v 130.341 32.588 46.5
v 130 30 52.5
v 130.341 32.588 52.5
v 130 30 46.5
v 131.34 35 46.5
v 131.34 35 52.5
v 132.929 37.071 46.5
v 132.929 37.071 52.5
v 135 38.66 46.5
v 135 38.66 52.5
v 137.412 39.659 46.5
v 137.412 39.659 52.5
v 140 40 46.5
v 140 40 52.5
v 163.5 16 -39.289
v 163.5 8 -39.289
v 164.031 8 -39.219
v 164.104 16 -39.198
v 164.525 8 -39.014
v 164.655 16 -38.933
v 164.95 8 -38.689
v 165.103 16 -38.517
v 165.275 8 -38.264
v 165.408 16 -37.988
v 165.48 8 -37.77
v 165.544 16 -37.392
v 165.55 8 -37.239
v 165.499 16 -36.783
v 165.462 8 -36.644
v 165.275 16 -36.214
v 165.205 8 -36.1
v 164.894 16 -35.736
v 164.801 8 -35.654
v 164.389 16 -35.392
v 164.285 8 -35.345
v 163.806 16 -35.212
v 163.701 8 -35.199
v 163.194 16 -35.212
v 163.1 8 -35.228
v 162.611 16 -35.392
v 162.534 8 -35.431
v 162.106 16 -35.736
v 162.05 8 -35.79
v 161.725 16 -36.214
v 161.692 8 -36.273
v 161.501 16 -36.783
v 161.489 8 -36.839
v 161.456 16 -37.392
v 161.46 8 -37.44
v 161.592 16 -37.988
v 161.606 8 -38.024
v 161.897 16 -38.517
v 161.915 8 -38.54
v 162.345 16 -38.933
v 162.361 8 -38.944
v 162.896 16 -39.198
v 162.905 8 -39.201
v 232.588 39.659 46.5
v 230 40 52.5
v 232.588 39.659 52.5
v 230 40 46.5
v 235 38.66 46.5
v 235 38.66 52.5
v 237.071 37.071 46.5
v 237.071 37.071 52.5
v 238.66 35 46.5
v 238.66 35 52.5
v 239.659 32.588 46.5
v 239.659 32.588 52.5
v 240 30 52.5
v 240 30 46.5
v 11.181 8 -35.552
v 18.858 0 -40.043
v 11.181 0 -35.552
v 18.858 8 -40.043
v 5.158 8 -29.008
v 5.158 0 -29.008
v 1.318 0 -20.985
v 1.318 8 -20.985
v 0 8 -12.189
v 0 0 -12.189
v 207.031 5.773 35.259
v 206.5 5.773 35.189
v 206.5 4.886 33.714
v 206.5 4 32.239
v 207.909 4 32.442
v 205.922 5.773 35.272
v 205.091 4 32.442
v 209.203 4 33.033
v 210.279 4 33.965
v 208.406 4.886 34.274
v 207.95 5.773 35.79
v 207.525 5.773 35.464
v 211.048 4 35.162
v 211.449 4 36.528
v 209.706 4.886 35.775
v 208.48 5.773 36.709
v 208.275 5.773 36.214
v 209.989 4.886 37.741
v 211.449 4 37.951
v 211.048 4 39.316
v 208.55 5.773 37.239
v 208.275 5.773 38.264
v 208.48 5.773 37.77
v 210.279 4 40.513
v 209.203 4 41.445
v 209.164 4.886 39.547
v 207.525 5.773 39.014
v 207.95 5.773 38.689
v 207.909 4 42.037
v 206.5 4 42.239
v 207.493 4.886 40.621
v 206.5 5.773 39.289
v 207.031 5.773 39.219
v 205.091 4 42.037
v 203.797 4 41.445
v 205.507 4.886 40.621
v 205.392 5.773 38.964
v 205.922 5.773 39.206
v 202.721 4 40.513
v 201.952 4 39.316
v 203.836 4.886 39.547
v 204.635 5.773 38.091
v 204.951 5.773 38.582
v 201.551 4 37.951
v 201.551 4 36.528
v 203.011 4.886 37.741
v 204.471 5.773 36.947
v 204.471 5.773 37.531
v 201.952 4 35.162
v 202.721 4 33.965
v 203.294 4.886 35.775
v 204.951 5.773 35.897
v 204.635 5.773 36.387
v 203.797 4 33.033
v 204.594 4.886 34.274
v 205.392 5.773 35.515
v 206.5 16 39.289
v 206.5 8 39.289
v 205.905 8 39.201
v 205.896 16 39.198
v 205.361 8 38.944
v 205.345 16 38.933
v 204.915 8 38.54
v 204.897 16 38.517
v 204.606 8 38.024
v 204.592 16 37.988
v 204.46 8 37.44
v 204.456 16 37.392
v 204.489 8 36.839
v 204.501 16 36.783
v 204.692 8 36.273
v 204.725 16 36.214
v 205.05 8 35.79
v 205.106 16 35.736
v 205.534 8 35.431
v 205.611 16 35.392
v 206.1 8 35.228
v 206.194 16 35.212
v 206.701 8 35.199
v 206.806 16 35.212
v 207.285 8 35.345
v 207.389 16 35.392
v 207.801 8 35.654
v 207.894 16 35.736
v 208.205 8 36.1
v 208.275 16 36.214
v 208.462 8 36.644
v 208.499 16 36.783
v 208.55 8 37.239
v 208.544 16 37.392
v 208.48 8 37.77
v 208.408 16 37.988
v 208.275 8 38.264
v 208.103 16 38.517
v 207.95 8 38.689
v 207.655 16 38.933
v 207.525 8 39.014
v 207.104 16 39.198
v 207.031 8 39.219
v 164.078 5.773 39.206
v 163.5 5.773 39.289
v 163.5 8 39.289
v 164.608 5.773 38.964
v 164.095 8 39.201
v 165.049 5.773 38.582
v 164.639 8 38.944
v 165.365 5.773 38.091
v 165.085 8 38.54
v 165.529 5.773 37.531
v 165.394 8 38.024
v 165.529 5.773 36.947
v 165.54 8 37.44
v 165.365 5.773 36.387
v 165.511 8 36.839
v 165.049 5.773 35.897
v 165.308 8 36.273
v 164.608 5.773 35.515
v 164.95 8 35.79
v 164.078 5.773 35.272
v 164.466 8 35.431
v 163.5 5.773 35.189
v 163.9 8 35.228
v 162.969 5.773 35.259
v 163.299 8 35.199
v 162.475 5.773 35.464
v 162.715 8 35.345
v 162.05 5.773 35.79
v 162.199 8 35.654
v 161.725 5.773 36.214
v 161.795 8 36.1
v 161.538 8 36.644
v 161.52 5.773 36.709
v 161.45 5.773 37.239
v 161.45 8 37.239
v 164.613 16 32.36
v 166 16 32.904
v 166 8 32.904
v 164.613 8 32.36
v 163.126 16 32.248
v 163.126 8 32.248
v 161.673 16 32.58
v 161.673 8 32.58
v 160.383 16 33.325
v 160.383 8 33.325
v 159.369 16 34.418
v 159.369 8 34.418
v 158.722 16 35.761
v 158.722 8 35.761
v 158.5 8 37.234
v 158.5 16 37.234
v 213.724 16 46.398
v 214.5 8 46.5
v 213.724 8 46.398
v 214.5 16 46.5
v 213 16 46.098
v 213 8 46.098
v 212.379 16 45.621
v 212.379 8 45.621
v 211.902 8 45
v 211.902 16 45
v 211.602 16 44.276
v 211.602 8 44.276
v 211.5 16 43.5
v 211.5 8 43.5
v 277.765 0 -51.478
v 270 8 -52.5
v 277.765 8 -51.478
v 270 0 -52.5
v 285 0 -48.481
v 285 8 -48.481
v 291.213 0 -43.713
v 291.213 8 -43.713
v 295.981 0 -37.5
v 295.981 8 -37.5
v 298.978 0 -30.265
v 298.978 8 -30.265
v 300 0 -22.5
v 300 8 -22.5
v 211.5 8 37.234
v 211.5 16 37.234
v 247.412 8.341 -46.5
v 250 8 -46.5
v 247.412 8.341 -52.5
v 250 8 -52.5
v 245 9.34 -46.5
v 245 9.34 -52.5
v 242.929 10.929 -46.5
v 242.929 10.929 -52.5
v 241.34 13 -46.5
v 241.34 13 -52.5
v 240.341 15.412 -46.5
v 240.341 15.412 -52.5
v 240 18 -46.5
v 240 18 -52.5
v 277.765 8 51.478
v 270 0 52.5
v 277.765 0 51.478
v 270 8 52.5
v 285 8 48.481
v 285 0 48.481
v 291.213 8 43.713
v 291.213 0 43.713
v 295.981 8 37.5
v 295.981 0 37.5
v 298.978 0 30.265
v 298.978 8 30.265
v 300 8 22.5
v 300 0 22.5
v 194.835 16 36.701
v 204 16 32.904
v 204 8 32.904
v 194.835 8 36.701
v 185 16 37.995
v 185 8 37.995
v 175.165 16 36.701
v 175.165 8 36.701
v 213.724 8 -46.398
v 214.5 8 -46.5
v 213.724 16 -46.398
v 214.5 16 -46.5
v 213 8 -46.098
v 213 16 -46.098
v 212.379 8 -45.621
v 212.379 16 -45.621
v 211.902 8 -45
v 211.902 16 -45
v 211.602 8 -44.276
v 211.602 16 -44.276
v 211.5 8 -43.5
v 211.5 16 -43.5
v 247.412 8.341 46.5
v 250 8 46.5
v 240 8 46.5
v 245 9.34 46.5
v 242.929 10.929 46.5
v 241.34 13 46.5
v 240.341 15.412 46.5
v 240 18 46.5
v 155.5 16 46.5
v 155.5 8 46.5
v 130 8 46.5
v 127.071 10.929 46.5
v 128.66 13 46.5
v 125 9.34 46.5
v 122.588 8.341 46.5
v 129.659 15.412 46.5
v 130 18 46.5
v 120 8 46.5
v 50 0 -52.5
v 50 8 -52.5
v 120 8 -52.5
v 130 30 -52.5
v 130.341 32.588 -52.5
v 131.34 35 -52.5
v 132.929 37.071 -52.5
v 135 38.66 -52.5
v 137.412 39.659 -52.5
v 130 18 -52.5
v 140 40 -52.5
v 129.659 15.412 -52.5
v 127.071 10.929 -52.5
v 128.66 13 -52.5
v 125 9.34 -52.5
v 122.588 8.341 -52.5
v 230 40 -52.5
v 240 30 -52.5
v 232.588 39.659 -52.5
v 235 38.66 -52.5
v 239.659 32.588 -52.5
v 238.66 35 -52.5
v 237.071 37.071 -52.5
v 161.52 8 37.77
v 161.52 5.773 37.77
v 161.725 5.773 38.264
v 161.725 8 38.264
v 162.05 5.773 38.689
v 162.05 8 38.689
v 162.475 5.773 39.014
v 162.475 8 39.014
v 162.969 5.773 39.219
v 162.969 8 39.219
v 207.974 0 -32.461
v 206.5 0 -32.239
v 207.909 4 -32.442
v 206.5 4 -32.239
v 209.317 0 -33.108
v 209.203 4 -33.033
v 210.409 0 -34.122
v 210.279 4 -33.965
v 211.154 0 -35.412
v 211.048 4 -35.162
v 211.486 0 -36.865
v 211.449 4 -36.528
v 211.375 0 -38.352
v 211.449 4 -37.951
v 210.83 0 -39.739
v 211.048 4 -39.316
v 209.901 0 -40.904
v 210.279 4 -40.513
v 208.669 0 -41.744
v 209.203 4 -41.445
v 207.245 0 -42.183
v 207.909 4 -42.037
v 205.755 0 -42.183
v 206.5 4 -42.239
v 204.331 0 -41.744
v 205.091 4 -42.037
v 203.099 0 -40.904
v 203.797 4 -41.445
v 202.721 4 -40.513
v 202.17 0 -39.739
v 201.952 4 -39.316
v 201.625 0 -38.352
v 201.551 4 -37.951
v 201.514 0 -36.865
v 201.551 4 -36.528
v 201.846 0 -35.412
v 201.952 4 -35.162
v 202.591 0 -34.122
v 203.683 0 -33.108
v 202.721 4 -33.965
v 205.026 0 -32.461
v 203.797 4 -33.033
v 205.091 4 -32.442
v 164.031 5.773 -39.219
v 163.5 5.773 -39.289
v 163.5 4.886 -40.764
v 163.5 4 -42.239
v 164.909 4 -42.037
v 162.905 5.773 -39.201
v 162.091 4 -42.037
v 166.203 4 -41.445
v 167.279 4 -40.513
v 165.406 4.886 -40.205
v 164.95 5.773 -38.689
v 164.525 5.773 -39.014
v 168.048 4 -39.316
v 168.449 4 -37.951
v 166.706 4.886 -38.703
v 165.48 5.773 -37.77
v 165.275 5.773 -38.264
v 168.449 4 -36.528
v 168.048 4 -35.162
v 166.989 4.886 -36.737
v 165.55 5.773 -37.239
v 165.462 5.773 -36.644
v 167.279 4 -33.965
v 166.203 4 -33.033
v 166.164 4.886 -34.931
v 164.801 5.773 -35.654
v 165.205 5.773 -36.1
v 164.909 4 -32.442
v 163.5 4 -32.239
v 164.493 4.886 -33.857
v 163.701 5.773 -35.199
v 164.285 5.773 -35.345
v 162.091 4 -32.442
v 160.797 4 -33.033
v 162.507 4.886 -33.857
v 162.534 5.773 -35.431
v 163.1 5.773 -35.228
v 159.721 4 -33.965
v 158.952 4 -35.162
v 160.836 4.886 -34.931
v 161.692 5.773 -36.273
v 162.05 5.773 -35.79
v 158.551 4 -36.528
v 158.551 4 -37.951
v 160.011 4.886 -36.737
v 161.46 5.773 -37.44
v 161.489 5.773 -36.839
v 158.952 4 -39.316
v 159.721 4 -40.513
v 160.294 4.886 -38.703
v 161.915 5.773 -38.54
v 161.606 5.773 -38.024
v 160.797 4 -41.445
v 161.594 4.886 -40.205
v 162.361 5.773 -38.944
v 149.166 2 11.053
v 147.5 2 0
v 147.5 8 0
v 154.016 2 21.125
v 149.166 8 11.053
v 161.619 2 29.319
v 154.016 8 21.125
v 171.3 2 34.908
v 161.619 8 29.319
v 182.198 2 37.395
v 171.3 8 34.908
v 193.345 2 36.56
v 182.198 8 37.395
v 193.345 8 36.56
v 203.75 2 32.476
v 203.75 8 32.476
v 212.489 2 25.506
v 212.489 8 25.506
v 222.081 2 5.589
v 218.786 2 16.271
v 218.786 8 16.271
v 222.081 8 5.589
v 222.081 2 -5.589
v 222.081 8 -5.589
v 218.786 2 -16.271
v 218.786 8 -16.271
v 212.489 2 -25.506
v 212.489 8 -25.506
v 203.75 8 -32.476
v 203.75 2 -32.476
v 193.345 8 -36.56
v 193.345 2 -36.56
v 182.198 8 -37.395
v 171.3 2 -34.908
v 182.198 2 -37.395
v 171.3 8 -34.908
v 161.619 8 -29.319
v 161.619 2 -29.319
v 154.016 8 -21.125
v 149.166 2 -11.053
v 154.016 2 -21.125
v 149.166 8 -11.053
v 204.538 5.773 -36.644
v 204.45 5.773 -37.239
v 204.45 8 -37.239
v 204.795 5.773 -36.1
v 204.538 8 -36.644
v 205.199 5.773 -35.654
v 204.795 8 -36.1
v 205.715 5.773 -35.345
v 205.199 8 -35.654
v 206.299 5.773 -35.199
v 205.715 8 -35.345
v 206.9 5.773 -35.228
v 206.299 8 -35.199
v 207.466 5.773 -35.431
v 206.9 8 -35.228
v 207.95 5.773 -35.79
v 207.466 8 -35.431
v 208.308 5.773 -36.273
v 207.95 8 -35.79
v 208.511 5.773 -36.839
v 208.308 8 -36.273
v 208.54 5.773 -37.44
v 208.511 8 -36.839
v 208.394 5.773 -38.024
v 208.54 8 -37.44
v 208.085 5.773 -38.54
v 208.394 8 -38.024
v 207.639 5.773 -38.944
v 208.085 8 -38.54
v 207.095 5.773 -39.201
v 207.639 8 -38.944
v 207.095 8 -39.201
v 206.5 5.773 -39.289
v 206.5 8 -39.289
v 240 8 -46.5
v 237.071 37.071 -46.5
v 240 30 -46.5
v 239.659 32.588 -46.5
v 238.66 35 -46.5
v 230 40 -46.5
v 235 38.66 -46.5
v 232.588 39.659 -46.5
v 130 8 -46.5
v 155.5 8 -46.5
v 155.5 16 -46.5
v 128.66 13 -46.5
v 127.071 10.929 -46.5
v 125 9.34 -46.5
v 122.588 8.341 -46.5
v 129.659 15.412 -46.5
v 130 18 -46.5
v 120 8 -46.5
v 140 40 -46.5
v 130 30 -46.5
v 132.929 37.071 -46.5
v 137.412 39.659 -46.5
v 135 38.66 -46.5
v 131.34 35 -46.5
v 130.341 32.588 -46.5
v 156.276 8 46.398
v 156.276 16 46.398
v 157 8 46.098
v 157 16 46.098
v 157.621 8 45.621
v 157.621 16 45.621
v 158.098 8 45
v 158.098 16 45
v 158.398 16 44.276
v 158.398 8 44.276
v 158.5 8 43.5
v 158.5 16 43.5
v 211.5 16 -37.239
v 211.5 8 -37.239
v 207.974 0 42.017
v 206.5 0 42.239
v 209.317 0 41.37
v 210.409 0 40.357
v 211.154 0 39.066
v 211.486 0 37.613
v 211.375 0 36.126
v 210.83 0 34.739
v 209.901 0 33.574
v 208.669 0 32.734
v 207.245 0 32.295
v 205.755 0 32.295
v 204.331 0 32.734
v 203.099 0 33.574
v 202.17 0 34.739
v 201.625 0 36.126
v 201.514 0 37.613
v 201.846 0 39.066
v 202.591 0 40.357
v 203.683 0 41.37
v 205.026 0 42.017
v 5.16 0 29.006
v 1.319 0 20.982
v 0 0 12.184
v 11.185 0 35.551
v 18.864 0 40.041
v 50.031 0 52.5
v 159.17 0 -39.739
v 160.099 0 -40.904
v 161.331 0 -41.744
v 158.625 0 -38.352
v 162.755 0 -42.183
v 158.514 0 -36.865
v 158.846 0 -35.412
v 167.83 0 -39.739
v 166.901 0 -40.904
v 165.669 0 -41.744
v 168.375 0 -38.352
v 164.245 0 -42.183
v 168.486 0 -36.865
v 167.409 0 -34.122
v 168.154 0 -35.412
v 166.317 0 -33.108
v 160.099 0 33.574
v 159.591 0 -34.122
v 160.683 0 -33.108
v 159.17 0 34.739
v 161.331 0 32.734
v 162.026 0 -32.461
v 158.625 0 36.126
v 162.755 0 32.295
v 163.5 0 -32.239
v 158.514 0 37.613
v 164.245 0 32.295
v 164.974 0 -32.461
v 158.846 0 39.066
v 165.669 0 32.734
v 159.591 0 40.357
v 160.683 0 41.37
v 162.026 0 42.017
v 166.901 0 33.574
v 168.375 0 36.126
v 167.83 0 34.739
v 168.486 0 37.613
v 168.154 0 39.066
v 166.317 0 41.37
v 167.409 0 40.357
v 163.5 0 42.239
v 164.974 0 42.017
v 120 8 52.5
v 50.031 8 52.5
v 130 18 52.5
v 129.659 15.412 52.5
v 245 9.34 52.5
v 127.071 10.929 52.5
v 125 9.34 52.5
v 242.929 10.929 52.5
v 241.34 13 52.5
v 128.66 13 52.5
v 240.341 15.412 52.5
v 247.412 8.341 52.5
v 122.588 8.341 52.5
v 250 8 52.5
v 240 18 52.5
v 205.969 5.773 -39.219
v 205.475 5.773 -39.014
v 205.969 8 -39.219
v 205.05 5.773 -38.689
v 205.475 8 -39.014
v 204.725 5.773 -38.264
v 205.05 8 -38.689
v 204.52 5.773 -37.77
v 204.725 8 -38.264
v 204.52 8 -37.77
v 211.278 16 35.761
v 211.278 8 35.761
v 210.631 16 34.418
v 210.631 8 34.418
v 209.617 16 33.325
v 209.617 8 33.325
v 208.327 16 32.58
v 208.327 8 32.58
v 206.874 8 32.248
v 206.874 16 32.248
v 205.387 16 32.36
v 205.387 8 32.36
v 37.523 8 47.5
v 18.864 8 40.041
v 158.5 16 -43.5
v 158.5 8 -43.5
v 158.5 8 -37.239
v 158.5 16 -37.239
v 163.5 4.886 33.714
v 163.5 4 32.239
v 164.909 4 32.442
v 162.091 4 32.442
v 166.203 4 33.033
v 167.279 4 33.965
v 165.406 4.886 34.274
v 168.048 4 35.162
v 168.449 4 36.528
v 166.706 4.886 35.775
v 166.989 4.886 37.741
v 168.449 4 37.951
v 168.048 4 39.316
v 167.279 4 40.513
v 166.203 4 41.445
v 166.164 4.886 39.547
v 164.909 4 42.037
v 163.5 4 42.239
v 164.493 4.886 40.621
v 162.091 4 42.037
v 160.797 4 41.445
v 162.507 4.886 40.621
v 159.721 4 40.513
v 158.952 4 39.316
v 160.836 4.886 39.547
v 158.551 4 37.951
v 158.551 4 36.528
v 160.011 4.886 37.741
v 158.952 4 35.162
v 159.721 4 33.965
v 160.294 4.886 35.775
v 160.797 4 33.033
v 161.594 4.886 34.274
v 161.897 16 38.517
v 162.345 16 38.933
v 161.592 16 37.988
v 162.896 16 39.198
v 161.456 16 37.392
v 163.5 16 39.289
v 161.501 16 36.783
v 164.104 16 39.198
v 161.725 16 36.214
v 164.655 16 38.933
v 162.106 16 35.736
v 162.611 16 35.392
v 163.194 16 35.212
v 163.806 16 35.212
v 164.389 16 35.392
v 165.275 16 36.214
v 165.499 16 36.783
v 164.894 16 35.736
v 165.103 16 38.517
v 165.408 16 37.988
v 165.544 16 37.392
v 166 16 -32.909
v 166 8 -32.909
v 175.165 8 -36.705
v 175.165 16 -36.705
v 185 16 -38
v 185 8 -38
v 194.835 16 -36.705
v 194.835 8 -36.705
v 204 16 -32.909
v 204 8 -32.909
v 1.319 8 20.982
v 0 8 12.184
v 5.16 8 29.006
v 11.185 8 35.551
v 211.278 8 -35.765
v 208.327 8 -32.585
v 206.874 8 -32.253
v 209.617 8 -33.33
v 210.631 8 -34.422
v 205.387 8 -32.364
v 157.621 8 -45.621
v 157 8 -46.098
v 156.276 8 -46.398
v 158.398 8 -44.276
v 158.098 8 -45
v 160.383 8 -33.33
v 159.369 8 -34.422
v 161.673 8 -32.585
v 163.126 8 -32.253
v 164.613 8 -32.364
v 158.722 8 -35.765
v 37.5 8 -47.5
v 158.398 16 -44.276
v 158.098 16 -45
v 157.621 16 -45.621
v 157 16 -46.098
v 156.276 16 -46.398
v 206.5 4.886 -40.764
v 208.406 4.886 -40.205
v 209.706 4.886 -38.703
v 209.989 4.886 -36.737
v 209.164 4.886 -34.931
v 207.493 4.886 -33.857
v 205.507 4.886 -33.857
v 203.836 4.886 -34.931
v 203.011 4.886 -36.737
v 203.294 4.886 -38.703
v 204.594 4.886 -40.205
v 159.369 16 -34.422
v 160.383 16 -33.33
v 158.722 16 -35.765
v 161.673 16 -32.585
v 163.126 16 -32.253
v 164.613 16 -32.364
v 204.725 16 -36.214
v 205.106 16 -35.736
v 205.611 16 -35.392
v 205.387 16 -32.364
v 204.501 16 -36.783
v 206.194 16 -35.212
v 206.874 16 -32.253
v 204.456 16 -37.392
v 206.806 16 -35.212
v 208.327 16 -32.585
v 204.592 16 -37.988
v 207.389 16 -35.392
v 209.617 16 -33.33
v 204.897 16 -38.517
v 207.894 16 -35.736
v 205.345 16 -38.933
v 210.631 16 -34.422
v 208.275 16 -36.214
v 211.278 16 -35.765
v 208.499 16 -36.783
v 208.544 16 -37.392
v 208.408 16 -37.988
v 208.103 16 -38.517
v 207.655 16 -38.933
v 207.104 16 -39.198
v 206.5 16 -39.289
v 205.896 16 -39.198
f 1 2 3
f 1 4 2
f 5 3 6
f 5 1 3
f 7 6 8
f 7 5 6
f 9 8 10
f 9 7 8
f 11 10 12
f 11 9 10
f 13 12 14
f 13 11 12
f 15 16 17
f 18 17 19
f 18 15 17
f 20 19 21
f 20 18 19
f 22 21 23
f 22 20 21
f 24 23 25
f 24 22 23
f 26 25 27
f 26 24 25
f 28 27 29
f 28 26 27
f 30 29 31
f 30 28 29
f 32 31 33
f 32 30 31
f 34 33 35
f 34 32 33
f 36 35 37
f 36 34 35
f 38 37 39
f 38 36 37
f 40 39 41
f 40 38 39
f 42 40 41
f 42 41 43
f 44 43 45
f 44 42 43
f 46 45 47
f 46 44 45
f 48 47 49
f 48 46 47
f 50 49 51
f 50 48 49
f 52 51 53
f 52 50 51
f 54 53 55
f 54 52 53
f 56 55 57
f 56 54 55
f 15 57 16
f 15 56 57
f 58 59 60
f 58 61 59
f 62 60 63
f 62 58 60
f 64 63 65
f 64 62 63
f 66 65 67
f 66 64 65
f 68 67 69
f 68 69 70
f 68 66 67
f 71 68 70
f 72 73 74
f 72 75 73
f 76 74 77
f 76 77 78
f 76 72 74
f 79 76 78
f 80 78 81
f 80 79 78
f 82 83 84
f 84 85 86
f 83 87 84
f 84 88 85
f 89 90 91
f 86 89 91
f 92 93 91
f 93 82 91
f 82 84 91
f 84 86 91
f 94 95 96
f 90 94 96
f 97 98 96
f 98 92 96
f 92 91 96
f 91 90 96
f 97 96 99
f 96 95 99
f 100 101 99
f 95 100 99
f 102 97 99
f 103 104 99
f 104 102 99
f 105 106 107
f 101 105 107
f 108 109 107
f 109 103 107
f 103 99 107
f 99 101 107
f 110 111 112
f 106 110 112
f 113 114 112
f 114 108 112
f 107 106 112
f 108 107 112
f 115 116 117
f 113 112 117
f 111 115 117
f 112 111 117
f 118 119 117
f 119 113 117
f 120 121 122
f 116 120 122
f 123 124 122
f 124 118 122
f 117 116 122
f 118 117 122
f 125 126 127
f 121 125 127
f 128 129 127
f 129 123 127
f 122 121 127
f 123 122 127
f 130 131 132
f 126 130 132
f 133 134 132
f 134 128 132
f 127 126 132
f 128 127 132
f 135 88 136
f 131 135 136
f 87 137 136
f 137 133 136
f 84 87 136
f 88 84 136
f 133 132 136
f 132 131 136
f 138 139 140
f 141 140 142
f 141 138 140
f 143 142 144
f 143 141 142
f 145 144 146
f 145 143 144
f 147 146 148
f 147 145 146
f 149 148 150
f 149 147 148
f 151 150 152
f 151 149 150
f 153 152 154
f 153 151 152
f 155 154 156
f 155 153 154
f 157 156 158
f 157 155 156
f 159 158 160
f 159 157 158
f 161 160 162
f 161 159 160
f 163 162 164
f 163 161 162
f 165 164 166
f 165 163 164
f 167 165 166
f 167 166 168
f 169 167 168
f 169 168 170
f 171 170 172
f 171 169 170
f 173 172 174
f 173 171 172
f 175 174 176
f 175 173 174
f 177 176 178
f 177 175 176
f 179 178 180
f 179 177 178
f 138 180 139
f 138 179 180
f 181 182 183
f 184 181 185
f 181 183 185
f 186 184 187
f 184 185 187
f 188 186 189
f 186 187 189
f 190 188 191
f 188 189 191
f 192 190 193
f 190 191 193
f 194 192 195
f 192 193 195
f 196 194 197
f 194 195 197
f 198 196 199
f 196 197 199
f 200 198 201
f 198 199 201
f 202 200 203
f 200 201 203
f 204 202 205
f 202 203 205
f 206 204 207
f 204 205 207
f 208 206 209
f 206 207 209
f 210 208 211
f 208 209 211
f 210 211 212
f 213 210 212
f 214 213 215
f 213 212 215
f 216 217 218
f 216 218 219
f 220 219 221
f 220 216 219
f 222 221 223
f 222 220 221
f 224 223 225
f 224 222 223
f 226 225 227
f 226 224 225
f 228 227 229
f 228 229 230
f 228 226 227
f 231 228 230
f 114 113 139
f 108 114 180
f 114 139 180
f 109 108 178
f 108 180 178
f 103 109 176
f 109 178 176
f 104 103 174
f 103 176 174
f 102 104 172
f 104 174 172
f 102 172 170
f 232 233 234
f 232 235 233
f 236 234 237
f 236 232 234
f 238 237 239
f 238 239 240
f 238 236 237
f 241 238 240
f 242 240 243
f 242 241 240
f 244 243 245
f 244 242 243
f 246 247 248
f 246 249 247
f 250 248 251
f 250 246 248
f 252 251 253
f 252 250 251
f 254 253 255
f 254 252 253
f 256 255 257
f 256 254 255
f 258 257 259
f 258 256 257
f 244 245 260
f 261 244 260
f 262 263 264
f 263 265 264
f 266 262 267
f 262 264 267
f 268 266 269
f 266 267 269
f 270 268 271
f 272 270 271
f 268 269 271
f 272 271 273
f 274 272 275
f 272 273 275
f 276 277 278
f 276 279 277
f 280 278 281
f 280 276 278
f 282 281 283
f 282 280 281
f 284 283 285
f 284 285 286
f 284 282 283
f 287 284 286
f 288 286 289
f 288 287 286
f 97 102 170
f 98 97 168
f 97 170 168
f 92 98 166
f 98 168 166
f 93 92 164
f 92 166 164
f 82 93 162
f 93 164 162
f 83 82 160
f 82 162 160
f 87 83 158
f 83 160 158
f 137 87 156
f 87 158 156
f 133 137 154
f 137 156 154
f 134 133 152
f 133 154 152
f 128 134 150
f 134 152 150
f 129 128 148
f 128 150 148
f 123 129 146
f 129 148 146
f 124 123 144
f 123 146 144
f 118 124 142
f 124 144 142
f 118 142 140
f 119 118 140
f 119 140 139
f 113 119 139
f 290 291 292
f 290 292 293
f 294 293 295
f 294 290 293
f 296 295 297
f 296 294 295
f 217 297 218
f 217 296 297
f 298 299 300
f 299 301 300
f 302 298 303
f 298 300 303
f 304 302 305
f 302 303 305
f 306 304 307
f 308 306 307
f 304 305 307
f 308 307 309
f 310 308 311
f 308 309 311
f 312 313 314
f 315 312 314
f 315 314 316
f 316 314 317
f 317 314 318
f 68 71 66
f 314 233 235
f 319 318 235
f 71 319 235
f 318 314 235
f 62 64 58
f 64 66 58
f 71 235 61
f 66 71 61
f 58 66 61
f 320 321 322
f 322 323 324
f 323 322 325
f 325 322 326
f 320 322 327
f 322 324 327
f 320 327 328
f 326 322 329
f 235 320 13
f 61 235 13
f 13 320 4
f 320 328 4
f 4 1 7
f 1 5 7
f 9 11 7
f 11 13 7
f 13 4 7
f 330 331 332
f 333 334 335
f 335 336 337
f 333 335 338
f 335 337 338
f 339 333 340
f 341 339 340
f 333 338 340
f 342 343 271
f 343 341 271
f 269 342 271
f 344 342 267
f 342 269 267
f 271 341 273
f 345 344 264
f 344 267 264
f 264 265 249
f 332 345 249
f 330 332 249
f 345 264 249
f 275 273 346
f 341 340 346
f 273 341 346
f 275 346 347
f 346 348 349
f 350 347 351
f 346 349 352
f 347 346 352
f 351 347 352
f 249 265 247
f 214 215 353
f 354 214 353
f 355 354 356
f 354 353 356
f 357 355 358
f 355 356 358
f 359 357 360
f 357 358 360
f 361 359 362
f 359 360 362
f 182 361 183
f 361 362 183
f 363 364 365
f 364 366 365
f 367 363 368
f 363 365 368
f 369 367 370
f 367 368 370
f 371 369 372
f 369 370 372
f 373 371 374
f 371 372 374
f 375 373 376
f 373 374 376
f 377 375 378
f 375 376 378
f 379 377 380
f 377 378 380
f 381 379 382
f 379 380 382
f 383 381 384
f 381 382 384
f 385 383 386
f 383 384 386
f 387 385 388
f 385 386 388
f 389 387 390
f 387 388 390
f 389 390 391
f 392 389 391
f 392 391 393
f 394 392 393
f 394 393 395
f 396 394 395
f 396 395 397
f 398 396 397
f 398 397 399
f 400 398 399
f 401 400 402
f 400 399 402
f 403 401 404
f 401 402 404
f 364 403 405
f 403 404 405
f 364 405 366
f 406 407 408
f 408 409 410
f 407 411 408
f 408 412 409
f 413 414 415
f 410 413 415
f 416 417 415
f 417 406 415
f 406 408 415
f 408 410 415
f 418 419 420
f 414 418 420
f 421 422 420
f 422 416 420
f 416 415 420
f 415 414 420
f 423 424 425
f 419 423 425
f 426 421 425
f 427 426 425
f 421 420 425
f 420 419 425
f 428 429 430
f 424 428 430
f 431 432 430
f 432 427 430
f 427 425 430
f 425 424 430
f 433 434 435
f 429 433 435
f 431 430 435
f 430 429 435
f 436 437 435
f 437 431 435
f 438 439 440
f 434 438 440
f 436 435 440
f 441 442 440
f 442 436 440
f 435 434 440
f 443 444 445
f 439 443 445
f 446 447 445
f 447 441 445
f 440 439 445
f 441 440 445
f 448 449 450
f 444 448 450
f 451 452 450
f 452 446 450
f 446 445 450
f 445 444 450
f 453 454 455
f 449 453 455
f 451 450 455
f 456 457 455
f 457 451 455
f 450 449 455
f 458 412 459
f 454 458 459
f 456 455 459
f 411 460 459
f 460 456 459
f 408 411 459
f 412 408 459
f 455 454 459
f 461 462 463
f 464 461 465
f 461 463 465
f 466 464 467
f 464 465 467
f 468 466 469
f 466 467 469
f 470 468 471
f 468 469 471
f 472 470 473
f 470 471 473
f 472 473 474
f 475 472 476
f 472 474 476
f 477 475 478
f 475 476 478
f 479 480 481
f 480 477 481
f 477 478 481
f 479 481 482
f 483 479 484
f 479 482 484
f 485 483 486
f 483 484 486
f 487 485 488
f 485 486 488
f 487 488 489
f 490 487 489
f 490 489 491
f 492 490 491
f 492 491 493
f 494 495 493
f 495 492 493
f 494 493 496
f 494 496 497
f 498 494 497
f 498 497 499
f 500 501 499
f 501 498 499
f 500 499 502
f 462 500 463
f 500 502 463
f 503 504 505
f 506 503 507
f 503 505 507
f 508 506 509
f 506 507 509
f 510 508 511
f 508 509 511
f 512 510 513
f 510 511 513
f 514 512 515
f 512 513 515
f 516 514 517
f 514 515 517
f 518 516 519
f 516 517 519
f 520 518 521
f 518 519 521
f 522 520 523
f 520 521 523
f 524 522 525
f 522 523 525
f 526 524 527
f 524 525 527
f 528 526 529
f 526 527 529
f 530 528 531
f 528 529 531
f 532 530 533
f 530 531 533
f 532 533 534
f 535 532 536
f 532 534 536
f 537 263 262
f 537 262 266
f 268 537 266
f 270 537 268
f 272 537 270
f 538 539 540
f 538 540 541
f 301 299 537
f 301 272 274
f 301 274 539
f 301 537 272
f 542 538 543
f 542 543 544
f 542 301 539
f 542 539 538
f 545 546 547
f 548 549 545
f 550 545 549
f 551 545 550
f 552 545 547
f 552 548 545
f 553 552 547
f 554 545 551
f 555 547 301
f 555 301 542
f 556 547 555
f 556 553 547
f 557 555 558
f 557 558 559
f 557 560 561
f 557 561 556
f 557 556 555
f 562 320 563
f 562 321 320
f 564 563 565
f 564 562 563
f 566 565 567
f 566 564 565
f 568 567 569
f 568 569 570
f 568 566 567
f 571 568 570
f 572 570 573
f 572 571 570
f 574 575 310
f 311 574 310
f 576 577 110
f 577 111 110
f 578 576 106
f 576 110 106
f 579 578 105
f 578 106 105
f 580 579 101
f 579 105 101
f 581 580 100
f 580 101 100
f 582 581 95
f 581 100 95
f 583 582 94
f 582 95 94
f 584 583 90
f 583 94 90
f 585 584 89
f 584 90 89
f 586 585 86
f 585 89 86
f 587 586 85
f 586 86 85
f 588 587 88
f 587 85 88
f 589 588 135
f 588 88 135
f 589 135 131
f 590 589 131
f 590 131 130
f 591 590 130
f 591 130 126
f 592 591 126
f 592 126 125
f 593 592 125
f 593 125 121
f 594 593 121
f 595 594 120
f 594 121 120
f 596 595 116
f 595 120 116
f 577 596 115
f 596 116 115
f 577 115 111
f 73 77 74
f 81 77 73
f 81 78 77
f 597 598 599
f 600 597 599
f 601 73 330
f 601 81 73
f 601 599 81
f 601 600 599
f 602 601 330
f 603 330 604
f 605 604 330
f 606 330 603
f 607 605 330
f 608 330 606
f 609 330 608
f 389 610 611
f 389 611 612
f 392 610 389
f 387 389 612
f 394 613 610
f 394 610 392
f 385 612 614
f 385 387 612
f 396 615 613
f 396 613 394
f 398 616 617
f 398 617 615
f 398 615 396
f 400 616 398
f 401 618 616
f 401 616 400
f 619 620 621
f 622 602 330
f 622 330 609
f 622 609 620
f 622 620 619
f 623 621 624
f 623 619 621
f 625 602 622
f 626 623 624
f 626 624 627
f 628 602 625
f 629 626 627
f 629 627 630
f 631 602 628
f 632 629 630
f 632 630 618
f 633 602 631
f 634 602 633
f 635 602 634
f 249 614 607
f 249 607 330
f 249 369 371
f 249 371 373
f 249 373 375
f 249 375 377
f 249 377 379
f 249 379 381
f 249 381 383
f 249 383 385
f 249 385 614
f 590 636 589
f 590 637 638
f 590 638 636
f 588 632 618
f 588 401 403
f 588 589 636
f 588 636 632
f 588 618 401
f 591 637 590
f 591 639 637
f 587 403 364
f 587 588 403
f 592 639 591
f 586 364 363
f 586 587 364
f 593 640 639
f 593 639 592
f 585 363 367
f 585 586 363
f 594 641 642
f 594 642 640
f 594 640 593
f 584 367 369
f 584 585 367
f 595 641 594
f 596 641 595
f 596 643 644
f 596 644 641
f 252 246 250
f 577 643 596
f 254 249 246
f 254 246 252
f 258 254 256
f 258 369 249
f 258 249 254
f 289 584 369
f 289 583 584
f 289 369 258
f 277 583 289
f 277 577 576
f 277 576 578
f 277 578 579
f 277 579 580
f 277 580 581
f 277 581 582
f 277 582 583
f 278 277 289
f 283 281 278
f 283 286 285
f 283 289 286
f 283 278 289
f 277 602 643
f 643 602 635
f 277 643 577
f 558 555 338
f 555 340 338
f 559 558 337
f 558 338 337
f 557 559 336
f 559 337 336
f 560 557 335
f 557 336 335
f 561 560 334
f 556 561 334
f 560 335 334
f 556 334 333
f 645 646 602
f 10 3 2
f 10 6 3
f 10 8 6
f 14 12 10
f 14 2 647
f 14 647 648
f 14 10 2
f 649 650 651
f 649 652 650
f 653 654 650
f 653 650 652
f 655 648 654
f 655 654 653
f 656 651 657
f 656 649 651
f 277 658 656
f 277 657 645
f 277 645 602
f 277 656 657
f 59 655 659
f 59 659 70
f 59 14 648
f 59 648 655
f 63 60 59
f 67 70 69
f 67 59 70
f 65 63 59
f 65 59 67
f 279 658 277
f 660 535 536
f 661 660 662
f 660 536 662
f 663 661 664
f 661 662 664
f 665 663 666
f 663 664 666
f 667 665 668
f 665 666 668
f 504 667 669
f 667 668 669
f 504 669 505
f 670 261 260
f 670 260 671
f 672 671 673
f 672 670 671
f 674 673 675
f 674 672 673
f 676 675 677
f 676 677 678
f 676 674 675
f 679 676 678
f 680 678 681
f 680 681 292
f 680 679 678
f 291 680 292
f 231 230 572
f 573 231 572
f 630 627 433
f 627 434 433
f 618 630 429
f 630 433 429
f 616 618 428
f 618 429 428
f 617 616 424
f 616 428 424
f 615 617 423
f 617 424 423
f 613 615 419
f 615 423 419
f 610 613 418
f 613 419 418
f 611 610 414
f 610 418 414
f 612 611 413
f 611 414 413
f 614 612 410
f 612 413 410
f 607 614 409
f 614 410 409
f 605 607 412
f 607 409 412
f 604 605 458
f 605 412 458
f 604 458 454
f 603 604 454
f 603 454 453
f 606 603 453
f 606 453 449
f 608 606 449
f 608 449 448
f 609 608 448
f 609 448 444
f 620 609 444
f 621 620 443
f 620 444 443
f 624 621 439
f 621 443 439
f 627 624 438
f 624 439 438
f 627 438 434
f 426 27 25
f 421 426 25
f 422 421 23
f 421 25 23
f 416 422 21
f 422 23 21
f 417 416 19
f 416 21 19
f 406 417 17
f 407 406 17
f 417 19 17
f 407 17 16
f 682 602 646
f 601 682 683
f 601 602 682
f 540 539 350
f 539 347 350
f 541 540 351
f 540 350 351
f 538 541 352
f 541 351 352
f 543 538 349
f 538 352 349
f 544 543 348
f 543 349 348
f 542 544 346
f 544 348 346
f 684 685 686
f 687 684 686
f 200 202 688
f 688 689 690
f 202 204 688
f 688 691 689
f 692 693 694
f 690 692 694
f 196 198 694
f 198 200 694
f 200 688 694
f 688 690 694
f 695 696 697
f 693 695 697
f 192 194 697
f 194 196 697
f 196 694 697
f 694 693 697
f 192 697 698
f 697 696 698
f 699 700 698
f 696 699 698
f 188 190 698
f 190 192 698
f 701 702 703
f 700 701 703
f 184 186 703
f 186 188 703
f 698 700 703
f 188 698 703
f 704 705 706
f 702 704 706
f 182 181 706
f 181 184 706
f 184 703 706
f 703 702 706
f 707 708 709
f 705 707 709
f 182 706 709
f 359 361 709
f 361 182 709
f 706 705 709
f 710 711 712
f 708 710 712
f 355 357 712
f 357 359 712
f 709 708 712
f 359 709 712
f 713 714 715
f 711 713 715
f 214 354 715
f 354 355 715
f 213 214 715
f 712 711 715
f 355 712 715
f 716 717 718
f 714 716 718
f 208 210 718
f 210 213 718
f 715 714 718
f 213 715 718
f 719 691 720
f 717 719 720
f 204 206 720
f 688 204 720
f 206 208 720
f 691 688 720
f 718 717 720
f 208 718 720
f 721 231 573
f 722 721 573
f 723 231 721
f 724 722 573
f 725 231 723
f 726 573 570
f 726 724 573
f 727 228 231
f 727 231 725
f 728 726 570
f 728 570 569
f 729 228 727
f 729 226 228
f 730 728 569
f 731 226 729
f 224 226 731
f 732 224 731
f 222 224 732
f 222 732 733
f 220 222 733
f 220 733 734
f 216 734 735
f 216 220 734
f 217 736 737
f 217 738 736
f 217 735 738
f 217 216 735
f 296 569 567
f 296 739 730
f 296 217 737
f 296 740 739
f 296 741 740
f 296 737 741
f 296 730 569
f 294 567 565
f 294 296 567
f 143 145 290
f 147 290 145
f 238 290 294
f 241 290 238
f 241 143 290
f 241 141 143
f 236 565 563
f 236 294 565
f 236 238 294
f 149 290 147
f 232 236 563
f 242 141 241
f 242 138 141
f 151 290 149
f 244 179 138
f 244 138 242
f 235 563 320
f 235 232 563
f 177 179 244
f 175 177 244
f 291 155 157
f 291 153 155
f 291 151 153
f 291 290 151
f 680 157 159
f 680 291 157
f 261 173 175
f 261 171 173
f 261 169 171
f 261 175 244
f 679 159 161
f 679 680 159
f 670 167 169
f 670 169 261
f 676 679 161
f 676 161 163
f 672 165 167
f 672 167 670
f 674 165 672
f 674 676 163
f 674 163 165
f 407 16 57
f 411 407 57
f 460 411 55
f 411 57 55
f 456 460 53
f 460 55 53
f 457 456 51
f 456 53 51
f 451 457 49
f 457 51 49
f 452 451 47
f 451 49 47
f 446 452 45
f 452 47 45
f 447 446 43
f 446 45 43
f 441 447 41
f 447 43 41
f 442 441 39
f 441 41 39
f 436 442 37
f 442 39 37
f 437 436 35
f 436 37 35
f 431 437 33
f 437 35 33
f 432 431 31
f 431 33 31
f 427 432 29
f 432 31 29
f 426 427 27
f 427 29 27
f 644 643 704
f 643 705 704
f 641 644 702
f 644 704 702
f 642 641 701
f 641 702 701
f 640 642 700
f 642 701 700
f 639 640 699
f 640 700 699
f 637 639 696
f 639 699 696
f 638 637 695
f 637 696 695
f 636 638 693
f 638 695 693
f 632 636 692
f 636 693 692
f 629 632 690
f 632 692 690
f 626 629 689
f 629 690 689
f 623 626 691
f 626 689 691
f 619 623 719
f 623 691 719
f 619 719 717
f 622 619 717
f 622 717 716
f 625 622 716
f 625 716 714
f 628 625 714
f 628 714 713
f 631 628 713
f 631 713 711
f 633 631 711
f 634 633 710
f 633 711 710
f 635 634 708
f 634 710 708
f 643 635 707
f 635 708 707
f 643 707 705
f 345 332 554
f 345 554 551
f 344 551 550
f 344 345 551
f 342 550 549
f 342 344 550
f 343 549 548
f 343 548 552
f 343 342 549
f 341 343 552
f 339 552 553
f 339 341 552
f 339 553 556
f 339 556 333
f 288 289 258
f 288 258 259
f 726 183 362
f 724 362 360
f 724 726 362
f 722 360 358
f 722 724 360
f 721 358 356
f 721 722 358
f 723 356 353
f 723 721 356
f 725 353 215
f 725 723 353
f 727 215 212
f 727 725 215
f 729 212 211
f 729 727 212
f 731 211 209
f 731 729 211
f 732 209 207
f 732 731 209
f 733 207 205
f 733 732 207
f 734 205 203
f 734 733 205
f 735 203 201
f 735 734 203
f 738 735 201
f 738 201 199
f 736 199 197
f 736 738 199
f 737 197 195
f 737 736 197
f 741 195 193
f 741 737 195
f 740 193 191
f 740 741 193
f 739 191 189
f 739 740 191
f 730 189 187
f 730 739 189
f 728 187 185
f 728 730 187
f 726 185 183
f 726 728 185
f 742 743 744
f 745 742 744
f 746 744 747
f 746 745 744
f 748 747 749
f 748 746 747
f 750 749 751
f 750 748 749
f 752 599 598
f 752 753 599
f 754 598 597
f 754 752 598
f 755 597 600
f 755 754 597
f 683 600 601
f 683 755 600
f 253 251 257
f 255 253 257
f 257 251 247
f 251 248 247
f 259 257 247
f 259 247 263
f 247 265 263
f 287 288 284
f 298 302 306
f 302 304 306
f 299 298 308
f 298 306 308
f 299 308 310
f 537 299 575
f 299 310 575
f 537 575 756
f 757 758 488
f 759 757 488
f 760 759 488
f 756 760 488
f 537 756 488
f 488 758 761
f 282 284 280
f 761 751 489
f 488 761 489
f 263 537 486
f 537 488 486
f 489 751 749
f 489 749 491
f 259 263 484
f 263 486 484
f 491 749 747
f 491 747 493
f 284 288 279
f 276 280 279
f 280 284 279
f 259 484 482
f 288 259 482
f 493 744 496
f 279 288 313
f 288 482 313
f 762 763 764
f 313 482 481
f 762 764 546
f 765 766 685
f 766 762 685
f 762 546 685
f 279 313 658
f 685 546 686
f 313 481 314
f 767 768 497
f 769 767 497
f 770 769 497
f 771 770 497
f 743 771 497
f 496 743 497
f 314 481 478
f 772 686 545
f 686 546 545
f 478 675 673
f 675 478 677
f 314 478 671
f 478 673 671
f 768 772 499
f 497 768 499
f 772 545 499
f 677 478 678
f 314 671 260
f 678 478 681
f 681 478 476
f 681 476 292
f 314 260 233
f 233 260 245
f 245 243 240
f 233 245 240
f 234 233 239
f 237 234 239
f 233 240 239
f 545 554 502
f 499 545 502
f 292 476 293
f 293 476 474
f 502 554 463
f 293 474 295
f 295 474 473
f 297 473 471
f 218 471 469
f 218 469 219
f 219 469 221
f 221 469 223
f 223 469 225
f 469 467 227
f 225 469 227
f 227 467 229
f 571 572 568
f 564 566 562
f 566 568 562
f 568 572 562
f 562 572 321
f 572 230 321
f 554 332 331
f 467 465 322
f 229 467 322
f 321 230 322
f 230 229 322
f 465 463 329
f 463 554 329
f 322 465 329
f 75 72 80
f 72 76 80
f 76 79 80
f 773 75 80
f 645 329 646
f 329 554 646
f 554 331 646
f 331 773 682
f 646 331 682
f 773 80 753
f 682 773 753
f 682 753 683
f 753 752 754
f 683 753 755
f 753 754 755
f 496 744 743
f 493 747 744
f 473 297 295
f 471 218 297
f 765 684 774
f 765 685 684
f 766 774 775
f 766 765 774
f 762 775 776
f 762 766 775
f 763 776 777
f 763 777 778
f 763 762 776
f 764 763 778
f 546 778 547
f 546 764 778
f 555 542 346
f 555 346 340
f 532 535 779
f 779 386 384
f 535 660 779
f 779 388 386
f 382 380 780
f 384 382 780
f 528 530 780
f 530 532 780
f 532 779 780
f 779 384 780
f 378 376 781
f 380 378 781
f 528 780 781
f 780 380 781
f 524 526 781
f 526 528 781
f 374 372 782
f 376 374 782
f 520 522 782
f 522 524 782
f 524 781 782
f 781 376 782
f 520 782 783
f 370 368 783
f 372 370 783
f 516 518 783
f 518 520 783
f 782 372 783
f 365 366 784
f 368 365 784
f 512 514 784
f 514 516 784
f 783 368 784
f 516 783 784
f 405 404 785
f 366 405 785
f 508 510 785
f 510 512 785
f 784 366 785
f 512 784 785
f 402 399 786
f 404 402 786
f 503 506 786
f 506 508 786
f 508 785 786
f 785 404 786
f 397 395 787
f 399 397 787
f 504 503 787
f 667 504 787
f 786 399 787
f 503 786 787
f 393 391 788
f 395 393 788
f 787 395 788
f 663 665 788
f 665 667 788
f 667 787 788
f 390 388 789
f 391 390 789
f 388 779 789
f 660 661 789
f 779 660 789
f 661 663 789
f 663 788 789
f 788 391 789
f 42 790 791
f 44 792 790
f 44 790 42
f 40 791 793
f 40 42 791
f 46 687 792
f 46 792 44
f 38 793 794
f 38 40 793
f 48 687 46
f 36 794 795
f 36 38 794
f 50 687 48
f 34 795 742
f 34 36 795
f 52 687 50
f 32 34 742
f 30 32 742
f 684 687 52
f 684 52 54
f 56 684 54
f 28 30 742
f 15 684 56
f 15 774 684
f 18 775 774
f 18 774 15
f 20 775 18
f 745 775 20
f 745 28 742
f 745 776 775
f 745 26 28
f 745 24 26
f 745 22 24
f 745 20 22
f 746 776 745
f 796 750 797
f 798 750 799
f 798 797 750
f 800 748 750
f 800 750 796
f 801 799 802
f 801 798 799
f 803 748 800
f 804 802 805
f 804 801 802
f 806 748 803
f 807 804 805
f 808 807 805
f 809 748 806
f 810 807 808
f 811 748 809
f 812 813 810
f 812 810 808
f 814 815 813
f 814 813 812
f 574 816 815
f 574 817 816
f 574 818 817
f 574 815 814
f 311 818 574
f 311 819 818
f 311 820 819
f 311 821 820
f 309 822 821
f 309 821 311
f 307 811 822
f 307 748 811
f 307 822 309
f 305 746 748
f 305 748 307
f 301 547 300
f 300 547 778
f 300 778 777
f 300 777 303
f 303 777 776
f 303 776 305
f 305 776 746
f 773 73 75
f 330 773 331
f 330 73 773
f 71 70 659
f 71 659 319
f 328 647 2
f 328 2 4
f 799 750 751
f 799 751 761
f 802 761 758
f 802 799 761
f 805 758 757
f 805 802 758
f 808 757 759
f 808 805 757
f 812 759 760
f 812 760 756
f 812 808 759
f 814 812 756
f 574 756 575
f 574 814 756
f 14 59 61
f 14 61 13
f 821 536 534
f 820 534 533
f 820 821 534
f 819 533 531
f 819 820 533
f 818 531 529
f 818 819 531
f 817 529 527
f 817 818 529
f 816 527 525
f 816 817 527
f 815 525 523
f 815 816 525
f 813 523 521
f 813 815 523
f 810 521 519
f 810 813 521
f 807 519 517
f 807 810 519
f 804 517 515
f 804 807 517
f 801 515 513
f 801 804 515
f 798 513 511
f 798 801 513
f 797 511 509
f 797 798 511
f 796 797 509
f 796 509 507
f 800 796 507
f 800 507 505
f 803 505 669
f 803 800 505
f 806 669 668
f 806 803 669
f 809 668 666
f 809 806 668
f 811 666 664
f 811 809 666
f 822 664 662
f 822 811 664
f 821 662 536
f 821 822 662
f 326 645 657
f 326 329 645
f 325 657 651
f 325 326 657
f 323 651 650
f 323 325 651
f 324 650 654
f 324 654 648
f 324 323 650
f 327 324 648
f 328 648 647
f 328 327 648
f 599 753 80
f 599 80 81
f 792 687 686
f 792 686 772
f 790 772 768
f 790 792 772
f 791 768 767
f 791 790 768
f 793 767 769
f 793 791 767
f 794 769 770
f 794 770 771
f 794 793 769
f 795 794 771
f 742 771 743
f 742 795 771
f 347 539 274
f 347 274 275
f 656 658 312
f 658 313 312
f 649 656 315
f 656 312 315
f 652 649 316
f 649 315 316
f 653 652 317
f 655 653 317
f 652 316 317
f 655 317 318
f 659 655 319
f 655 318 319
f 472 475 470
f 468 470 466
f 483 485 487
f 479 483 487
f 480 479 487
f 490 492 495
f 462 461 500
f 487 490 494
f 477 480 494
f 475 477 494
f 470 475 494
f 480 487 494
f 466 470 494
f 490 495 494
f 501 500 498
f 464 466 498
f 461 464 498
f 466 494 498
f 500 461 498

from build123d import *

# Parameters (mm, degrees)
EXTRUDE_1_DEPTH        = 52.5
SKETCH_3_W             = 60
SKETCH_3_H             = 105
CUT_EXTRUDE_1_DEPTH    = 32
SKETCH_4_W             = 54
SKETCH_4_H             = 71
SKETCH_4_R             = 9.5
EXTRUDE_3_DEPTH        = 22.5
SKETCH_4_3_W           = 54
SKETCH_4_3_H           = 71
SKETCH_4_3_R           = 9.5
CUT_EXTRUDE_2_DEPTH    = 14.5
SKETCH_5_R             = 9.5
SKETCH_5_R_2           = 8
EXTRUDE_4_DEPTH        = 2
EXTRUDE_START          = -2
SKETCH_6_R             = 9.5
SKETCH_6_R_2           = 8
EXTRUDE_5_DEPTH        = 2
FILLET_1_R             = 14
FILLET_1_OF_MIRROR_2_R = 14
SKETCH_8_W             = 95
SKETCH_8_H             = 78.931088685
CUT_EXTRUDE_4_DEPTH    = 130
SKETCH_10_W            = 100
SKETCH_10_H            = 93
CUT_EXTRUDE_6_DEPTH    = 32
CUT_EXTRUDE_7_DEPTH    = 73
SKETCH_12_W            = 19.42301832
SKETCH_12_H            = 121.860085881
CUT_EXTRUDE_8_DEPTH    = 73
CUT_EXTRUDE_10_DEPTH   = 150
SKETCH_15_R            = 2.05
SKETCH_15_R_2          = 37.5
CUT_EXTRUDE_11_DEPTH   = 313.725518626
SKETCH_18_W            = 61.222247188
SKETCH_18_H            = 97.808163194
CUT_EXTRUDE_13_DEPTH   = 170
SKETCH_19_R            = 37.5
EXTRUDE_6_DEPTH        = 2
FILLET_2_R             = 30
SKETCH_21_W            = 132.10932858
SKETCH_21_H            = 125.518868867
CUT_EXTRUDE_15_DEPTH   = 149
MM_1_D                 = 10
MM_1_DEPTH             = 4
MM_1_TIP               = 3.004303095
SKETCH_23_W            = 93
SKETCH_23_H            = 32
CUT_EXTRUDE_16_DEPTH   = 149
FILLET_3_R             = 10
EXTRUDE_START_2        = 8
EXTRUDE_8_DEPTH        = 8
CUT_EXTRUDE_START      = -47
SKETCH_27_R            = 2.05
CUT_EXTRUDE_18_DEPTH   = 47
FILLET_4_R             = 3


with BuildPart() as part:
    # 草图1 → 凸台-拉伸1 (new, symmetric)
    with BuildSketch(Plane.XY):
        Polygon((0, 0), (300, 0), (300, 40), (130, 40), (0, 8), align=None)
    extrude(amount=EXTRUDE_1_DEPTH, both=True)

    # 草图3 → 切除-拉伸1 (cut)
    with BuildSketch(Plane(origin=(0, 40, 0), x_dir=(1, 0, 0), z_dir=(0, 1, 0))):
        with Locations((270, 0)):
            Rectangle(SKETCH_3_W, SKETCH_3_H)
    extrude(amount=-CUT_EXTRUDE_1_DEPTH, mode=Mode.SUBTRACT)

    # 草图4 → 凸台-拉伸3 (add, symmetric)
    with BuildSketch(Plane.XY.offset(30)):
        with Locations((273, 43.5)):
            Rectangle(SKETCH_4_W, SKETCH_4_H)
        with Locations(Location((260, 65, 0), (0, 0, 180))):
            Circle(SKETCH_4_R, mode=Mode.SUBTRACT)
    extrude_3 = extrude(amount=EXTRUDE_3_DEPTH, both=True)

    # 草图4<3> → 切除-拉伸2 (cut, symmetric)
    with BuildSketch(Plane.XY.offset(30)):
        with Locations((273, 43.5)):
            Rectangle(SKETCH_4_3_W, SKETCH_4_3_H)
        with Locations(Location((260, 65, 0), (0, 0, 180))):
            Circle(SKETCH_4_3_R, mode=Mode.SUBTRACT)
    cut_extrude_2 = extrude(amount=CUT_EXTRUDE_2_DEPTH, both=True, mode=Mode.SUBTRACT)

    # 草图5 → 凸台-拉伸4 (add)
    with BuildSketch(Plane(origin=(0, 0, 44.5), x_dir=(-1, 0, 0), z_dir=(0, 0, -1))):
        with Locations((-260, 65)):
            Circle(SKETCH_5_R)
        with Locations((-260, 65)):
            Circle(SKETCH_5_R_2, mode=Mode.SUBTRACT)
    extrude_4 = extrude(amount=-EXTRUDE_4_DEPTH)

    # 草图6 → 凸台-拉伸5 (add)
    with BuildSketch(Plane.XY.offset(15.5).offset(EXTRUDE_START)):
        with Locations(Location((260, 65, 0), (0, 0, 180))):
            Circle(SKETCH_6_R)
        with Locations(Location((260, 65, 0), (0, 0, 180))):
            Circle(SKETCH_6_R_2, mode=Mode.SUBTRACT)
    extrude_5 = extrude(amount=EXTRUDE_5_DEPTH)

    # 圆角1
    fillet_1_edges = [part.edges().sort_by_distance(p)[0] for p in [
        (246, 79, 48.5),
        (246, 79, 11.5),
    ]]
    fillet(fillet_1_edges, radius=FILLET_1_R)

    # 镜向2: 凸台-拉伸3, 切除-拉伸2, 凸台-拉伸4, 凸台-拉伸5 across plane
    add(extrude_3.mirror(Plane.XY))
    add(cut_extrude_2.mirror(Plane.XY), mode=Mode.SUBTRACT)
    add(extrude_4.mirror(Plane.XY))
    add(extrude_5.mirror(Plane.XY))

    # 圆角1 of 镜向2
    fillet_1_of_mirror_2_edges = [part.edges().sort_by_distance(p)[0] for p in [
        (246, 79, -48.5),
        (246, 79, -11.5),
    ]]
    fillet(fillet_1_of_mirror_2_edges, radius=FILLET_1_OF_MIRROR_2_R)

    # 草图8 → 切除-拉伸4 (cut)
    with BuildSketch(Plane.ZY):
        with Locations((0, 47.465544343)):
            Rectangle(SKETCH_8_W, SKETCH_8_H)
    extrude(amount=-CUT_EXTRUDE_4_DEPTH, mode=Mode.SUBTRACT)

    # 草图10 → 切除-拉伸6 (cut)
    with BuildSketch(Plane(origin=(0, 40, 0), x_dir=(1, 0, 0), z_dir=(0, 1, 0))):
        with Locations((185, 0)):
            Rectangle(SKETCH_10_W, SKETCH_10_H)
    extrude(amount=-CUT_EXTRUDE_6_DEPTH, mode=Mode.SUBTRACT)

    # 草图11 → 切除-拉伸7 (cut)
    with BuildSketch(Plane.XZ):
        Polygon((-14.613233699, 52.5), (50.030946001, 52.5), (0, 32.5), (0, -32.5), (50, -52.5), (-14.613233699, -52.5), align=None)
    extrude(amount=-CUT_EXTRUDE_7_DEPTH, mode=Mode.SUBTRACT)

    # 草图12 → 切除-拉伸8 (cut)
    with BuildSketch(Plane(origin=(0, 8, 0), x_dir=(1, 0, 0), z_dir=(0, 1, 0))):
        with Locations((40.28849084, -8.430042941)):
            Rectangle(SKETCH_12_W, SKETCH_12_H)
    extrude(amount=CUT_EXTRUDE_8_DEPTH, mode=Mode.SUBTRACT)

    # 草图14 → 切除-拉伸10 (cut, symmetric)
    with BuildSketch(Plane.XY.offset(52.5)):
        with BuildLine():
            Line((275.075376069, 79), (318.037843951, 79))
            Line((318.037843951, 79), (300, 8))
            ThreePointArc((300, 8), (292.070381124, 45.091206629), (275.075376069, 79))
        make_face()
    extrude(amount=CUT_EXTRUDE_10_DEPTH, both=True, mode=Mode.SUBTRACT)

    # 草图15 → 切除-拉伸11 (cut, through all)
    with BuildSketch(Plane(origin=(0, 8, 0), x_dir=(1, 0, 0), z_dir=(0, 1, 0))):
        with Locations(Location((163.5, -37.239092363, 0), (0, 0, 180))):
            Circle(SKETCH_15_R)
        with Locations((163.5, 37.239092363)):
            Circle(SKETCH_15_R)
        with Locations(Location((206.5, 37.239092363, 0), (0, 0, 180))):
            Circle(SKETCH_15_R)
        with Locations((206.5, -37.239092363)):
            Circle(SKETCH_15_R)
        with Locations(Location((185, 0, 0), (0, 0, 180))):
            Circle(SKETCH_15_R_2)
    extrude(amount=-CUT_EXTRUDE_11_DEPTH, mode=Mode.SUBTRACT)

    # 草图18 → 切除-拉伸13 (cut)
    with BuildSketch(Plane.XY.offset(52.5)):
        with Locations((276.611123594, 56.904081597)):
            Rectangle(SKETCH_18_W, SKETCH_18_H)
    extrude(amount=-CUT_EXTRUDE_13_DEPTH, mode=Mode.SUBTRACT)

    # 草图19 → 凸台-拉伸6 (add)
    with BuildSketch(Plane.XZ.offset(EXTRUDE_START)):
        with Locations(Location((185, 0, 0), (0, 0, 180))):
            Circle(SKETCH_19_R)
    extrude(amount=EXTRUDE_6_DEPTH)

    # 圆角2
    fillet_2_edges = [part.edges().sort_by_distance(p)[0] for p in [
        (300, 4, 52.5),
        (0, 4, 32.5),
        (0, 4, -32.5),
        (300, 4, -52.5),
    ]]
    fillet(fillet_2_edges, radius=FILLET_2_R)

    # 草图21 → 切除-拉伸15 (cut)
    with BuildSketch(Plane(origin=(0, 8, 0), x_dir=(1, 0, 0), z_dir=(0, 1, 0))):
        with Locations((63.94533571, -10.259434434)):
            Rectangle(SKETCH_21_W, SKETCH_21_H)
    extrude(amount=CUT_EXTRUDE_15_DEPTH, mode=Mode.SUBTRACT)

    # 大小mm 暗销孔1
    with Locations(Plane(origin=(163.5, 0, 37.239092363), x_dir=(0, 0, -1), z_dir=(0, -1, 0))):
        with Locations((0, 0), (0, 43), (74.478184726, 43), (74.478184726, 0)):
            Hole(MM_1_D / 2, depth=MM_1_DEPTH)
            with Locations((0, 0, -(MM_1_DEPTH + MM_1_TIP / 2))):  # 118° drill point
                Cone(0, MM_1_D / 2, MM_1_TIP, mode=Mode.SUBTRACT)

    # 草图23 → 切除-拉伸16 (cut)
    with BuildSketch(Plane.ZY.offset(-130)):
        with Locations((0, 24)):
            Rectangle(SKETCH_23_W, SKETCH_23_H)
    extrude(amount=-CUT_EXTRUDE_16_DEPTH, mode=Mode.SUBTRACT)

    # 圆角3
    fillet_3_edges = [part.edges().sort_by_distance(p)[0] for p in [
        (130, 8, -49.5),
        (240, 40, -49.5),
        (240, 8, 49.5),
        (130, 8, 49.5),
        (130, 40, -49.5),
        (240, 8, -49.5),
        (240, 40, 49.5),
        (130, 40, 49.5),
    ]]
    fillet(fillet_3_edges, radius=FILLET_3_R)

    # 草图26 → 凸台-拉伸8 (add)
    with BuildSketch(Plane(origin=(0, 8, 0), x_dir=(1, 0, 0), z_dir=(0, 1, 0)).offset(EXTRUDE_START_2)):
        with BuildLine():
            Line((158.5, 46.5), (158.5, 37.239092363))
            ThreePointArc((158.5, 37.239092363), (161, 32.908965344), (166, 32.908965344))
            ThreePointArc((166, 32.908965344), (185, 38), (204, 32.908965344))
            ThreePointArc((204, 32.908965344), (209, 32.908965344), (211.5, 37.239092363))
            Line((211.5, 37.239092363), (211.5, 46.5))
            Line((211.5, 46.5), (211.5, 50.5))
            Line((211.5, 50.5), (158.5, 50.5))
            Line((158.5, 50.5), (158.5, 46.5))
        make_face()
        with BuildLine():
            Line((211.5, -46.495333446), (211.5, -37.234425809))
            ThreePointArc((211.5, -37.234425809), (209, -32.90429879), (204, -32.90429879))
            ThreePointArc((204, -32.90429879), (185, -37.995333446), (166, -32.90429879))
            ThreePointArc((166, -32.90429879), (161, -32.90429879), (158.5, -37.234425809))
            Line((158.5, -37.234425809), (158.5, -46.495333446))
            Line((158.5, -46.495333446), (158.5, -50.495333446))
            Line((158.5, -50.495333446), (211.5, -50.495333446))
            Line((211.5, -50.495333446), (211.5, -46.495333446))
        make_face()
    extrude(amount=-EXTRUDE_8_DEPTH)

    # 草图27 → 切除-拉伸18 (cut)
    with BuildSketch(Plane.XZ.offset(CUT_EXTRUDE_START)):
        with Locations(Location((206.5, -37.239092363, 0), (0, 0, 270))):
            Circle(SKETCH_27_R)
        with Locations(Location((163.5, -37.239092363, 0), (0, 0, 270))):
            Circle(SKETCH_27_R)
        with Locations(Location((163.5, 37.239092363, 0), (0, 0, 90))):
            Circle(SKETCH_27_R)
        with Locations(Location((206.5, 37.239092363, 0), (0, 0, 90))):
            Circle(SKETCH_27_R)
    extrude(amount=CUT_EXTRUDE_18_DEPTH, mode=Mode.SUBTRACT)

    # 圆角4
    fillet_4_edges = [part.edges().sort_by_distance(p)[0] for p in [
        (211.5, 12, -46.5),
        (158.5, 12, -46.5),
        (211.5, 12, 46.5),
        (158.5, 12, 46.5),
    ]]
    fillet(fillet_4_edges, radius=FILLET_4_R)


solid = part.part
